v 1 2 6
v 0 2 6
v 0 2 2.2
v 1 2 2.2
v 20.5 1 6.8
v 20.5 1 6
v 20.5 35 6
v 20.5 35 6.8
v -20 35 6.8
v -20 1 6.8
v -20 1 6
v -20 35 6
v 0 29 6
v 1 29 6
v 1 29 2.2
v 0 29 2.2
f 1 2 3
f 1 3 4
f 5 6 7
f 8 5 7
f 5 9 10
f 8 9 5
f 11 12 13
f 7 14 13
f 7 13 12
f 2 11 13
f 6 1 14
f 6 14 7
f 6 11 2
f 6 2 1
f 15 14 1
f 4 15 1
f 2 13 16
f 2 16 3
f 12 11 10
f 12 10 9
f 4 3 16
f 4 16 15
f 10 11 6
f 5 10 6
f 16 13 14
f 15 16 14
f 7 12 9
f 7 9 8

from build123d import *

# Parameters (mm, degrees)
SKETCH_W        = 42.5
SKETCH_H        = 36
PAD_DEPTH       = 6
SKETCH001_W     = 38.5
SKETCH001_H     = 32
POCKET_DEPTH    = 5
SKETCH002_W     = 40.5
SKETCH002_H     = 34
POCKET001_DEPTH = 1.2
SKETCH003_W     = 1
SKETCH003_H     = 27
PAD001_DEPTH    = 3.8
SKETCH004_W     = 40.5
SKETCH004_H     = 34
PAD002_DEPTH    = 2
SKETCH005_W     = 42.5
SKETCH005_H     = 6
POCKET002_DEPTH = 36.001
SKETCH006_W     = 1
SKETCH006_H     = 27
PAD003_DEPTH    = 3.8


with BuildPart() as part:
    # Sketch → Pad (new body)
    with BuildSketch(Plane.XY):
        with Locations((0.25, 18)):
            Rectangle(SKETCH_W, SKETCH_H)
    extrude(amount=PAD_DEPTH)

    # Sketch001 (on Face6 of Pad) → Pocket (cut)
    with BuildSketch(Plane.XY.offset(6)):
        with Locations((0.25, 18)):
            Rectangle(SKETCH001_W, SKETCH001_H)
    extrude(amount=-POCKET_DEPTH, mode=Mode.SUBTRACT)

    # Sketch002 (on Face5 of Pocket) → Pocket001 (cut)
    with BuildSketch(Plane.XY.offset(6)):
        with Locations((0.25, 18)):
            Rectangle(SKETCH002_W, SKETCH002_H)
    extrude(amount=-POCKET001_DEPTH, mode=Mode.SUBTRACT)

    # Sketch003 (on Face16 of Pocket001) → Pad001 (join)
    with BuildSketch(Plane.XY.offset(1)):
        with Locations((-0.5, 20.5)):
            Rectangle(SKETCH003_W, SKETCH003_H)
    extrude(amount=PAD001_DEPTH)

    # Sketch004 (on Face11 of Pad001) → Pad002 (join)
    with BuildSketch(Plane.XY.offset(4.8)):
        with Locations((0.25, 18)):
            Rectangle(SKETCH004_W, SKETCH004_H)
    extrude(amount=PAD002_DEPTH)

    # Sketch005 (on Face1 of Pad002) → Pocket002 (cut, through all)
    with BuildSketch(Plane.XZ):
        with Locations((0.25, 3)):
            Rectangle(SKETCH005_W, SKETCH005_H)
    extrude(amount=-POCKET002_DEPTH, mode=Mode.SUBTRACT)

    # Sketch006 (on Face2 of Pocket002) → Pad003 (join)
    with BuildSketch(Plane(origin=(0, 0, 6), x_dir=(1, 0, 0), z_dir=(0, 0, -1))):
        with Locations((0.5, -15.5)):
            Rectangle(SKETCH006_W, SKETCH006_H)
    extrude(amount=PAD003_DEPTH)


solid = part.part
